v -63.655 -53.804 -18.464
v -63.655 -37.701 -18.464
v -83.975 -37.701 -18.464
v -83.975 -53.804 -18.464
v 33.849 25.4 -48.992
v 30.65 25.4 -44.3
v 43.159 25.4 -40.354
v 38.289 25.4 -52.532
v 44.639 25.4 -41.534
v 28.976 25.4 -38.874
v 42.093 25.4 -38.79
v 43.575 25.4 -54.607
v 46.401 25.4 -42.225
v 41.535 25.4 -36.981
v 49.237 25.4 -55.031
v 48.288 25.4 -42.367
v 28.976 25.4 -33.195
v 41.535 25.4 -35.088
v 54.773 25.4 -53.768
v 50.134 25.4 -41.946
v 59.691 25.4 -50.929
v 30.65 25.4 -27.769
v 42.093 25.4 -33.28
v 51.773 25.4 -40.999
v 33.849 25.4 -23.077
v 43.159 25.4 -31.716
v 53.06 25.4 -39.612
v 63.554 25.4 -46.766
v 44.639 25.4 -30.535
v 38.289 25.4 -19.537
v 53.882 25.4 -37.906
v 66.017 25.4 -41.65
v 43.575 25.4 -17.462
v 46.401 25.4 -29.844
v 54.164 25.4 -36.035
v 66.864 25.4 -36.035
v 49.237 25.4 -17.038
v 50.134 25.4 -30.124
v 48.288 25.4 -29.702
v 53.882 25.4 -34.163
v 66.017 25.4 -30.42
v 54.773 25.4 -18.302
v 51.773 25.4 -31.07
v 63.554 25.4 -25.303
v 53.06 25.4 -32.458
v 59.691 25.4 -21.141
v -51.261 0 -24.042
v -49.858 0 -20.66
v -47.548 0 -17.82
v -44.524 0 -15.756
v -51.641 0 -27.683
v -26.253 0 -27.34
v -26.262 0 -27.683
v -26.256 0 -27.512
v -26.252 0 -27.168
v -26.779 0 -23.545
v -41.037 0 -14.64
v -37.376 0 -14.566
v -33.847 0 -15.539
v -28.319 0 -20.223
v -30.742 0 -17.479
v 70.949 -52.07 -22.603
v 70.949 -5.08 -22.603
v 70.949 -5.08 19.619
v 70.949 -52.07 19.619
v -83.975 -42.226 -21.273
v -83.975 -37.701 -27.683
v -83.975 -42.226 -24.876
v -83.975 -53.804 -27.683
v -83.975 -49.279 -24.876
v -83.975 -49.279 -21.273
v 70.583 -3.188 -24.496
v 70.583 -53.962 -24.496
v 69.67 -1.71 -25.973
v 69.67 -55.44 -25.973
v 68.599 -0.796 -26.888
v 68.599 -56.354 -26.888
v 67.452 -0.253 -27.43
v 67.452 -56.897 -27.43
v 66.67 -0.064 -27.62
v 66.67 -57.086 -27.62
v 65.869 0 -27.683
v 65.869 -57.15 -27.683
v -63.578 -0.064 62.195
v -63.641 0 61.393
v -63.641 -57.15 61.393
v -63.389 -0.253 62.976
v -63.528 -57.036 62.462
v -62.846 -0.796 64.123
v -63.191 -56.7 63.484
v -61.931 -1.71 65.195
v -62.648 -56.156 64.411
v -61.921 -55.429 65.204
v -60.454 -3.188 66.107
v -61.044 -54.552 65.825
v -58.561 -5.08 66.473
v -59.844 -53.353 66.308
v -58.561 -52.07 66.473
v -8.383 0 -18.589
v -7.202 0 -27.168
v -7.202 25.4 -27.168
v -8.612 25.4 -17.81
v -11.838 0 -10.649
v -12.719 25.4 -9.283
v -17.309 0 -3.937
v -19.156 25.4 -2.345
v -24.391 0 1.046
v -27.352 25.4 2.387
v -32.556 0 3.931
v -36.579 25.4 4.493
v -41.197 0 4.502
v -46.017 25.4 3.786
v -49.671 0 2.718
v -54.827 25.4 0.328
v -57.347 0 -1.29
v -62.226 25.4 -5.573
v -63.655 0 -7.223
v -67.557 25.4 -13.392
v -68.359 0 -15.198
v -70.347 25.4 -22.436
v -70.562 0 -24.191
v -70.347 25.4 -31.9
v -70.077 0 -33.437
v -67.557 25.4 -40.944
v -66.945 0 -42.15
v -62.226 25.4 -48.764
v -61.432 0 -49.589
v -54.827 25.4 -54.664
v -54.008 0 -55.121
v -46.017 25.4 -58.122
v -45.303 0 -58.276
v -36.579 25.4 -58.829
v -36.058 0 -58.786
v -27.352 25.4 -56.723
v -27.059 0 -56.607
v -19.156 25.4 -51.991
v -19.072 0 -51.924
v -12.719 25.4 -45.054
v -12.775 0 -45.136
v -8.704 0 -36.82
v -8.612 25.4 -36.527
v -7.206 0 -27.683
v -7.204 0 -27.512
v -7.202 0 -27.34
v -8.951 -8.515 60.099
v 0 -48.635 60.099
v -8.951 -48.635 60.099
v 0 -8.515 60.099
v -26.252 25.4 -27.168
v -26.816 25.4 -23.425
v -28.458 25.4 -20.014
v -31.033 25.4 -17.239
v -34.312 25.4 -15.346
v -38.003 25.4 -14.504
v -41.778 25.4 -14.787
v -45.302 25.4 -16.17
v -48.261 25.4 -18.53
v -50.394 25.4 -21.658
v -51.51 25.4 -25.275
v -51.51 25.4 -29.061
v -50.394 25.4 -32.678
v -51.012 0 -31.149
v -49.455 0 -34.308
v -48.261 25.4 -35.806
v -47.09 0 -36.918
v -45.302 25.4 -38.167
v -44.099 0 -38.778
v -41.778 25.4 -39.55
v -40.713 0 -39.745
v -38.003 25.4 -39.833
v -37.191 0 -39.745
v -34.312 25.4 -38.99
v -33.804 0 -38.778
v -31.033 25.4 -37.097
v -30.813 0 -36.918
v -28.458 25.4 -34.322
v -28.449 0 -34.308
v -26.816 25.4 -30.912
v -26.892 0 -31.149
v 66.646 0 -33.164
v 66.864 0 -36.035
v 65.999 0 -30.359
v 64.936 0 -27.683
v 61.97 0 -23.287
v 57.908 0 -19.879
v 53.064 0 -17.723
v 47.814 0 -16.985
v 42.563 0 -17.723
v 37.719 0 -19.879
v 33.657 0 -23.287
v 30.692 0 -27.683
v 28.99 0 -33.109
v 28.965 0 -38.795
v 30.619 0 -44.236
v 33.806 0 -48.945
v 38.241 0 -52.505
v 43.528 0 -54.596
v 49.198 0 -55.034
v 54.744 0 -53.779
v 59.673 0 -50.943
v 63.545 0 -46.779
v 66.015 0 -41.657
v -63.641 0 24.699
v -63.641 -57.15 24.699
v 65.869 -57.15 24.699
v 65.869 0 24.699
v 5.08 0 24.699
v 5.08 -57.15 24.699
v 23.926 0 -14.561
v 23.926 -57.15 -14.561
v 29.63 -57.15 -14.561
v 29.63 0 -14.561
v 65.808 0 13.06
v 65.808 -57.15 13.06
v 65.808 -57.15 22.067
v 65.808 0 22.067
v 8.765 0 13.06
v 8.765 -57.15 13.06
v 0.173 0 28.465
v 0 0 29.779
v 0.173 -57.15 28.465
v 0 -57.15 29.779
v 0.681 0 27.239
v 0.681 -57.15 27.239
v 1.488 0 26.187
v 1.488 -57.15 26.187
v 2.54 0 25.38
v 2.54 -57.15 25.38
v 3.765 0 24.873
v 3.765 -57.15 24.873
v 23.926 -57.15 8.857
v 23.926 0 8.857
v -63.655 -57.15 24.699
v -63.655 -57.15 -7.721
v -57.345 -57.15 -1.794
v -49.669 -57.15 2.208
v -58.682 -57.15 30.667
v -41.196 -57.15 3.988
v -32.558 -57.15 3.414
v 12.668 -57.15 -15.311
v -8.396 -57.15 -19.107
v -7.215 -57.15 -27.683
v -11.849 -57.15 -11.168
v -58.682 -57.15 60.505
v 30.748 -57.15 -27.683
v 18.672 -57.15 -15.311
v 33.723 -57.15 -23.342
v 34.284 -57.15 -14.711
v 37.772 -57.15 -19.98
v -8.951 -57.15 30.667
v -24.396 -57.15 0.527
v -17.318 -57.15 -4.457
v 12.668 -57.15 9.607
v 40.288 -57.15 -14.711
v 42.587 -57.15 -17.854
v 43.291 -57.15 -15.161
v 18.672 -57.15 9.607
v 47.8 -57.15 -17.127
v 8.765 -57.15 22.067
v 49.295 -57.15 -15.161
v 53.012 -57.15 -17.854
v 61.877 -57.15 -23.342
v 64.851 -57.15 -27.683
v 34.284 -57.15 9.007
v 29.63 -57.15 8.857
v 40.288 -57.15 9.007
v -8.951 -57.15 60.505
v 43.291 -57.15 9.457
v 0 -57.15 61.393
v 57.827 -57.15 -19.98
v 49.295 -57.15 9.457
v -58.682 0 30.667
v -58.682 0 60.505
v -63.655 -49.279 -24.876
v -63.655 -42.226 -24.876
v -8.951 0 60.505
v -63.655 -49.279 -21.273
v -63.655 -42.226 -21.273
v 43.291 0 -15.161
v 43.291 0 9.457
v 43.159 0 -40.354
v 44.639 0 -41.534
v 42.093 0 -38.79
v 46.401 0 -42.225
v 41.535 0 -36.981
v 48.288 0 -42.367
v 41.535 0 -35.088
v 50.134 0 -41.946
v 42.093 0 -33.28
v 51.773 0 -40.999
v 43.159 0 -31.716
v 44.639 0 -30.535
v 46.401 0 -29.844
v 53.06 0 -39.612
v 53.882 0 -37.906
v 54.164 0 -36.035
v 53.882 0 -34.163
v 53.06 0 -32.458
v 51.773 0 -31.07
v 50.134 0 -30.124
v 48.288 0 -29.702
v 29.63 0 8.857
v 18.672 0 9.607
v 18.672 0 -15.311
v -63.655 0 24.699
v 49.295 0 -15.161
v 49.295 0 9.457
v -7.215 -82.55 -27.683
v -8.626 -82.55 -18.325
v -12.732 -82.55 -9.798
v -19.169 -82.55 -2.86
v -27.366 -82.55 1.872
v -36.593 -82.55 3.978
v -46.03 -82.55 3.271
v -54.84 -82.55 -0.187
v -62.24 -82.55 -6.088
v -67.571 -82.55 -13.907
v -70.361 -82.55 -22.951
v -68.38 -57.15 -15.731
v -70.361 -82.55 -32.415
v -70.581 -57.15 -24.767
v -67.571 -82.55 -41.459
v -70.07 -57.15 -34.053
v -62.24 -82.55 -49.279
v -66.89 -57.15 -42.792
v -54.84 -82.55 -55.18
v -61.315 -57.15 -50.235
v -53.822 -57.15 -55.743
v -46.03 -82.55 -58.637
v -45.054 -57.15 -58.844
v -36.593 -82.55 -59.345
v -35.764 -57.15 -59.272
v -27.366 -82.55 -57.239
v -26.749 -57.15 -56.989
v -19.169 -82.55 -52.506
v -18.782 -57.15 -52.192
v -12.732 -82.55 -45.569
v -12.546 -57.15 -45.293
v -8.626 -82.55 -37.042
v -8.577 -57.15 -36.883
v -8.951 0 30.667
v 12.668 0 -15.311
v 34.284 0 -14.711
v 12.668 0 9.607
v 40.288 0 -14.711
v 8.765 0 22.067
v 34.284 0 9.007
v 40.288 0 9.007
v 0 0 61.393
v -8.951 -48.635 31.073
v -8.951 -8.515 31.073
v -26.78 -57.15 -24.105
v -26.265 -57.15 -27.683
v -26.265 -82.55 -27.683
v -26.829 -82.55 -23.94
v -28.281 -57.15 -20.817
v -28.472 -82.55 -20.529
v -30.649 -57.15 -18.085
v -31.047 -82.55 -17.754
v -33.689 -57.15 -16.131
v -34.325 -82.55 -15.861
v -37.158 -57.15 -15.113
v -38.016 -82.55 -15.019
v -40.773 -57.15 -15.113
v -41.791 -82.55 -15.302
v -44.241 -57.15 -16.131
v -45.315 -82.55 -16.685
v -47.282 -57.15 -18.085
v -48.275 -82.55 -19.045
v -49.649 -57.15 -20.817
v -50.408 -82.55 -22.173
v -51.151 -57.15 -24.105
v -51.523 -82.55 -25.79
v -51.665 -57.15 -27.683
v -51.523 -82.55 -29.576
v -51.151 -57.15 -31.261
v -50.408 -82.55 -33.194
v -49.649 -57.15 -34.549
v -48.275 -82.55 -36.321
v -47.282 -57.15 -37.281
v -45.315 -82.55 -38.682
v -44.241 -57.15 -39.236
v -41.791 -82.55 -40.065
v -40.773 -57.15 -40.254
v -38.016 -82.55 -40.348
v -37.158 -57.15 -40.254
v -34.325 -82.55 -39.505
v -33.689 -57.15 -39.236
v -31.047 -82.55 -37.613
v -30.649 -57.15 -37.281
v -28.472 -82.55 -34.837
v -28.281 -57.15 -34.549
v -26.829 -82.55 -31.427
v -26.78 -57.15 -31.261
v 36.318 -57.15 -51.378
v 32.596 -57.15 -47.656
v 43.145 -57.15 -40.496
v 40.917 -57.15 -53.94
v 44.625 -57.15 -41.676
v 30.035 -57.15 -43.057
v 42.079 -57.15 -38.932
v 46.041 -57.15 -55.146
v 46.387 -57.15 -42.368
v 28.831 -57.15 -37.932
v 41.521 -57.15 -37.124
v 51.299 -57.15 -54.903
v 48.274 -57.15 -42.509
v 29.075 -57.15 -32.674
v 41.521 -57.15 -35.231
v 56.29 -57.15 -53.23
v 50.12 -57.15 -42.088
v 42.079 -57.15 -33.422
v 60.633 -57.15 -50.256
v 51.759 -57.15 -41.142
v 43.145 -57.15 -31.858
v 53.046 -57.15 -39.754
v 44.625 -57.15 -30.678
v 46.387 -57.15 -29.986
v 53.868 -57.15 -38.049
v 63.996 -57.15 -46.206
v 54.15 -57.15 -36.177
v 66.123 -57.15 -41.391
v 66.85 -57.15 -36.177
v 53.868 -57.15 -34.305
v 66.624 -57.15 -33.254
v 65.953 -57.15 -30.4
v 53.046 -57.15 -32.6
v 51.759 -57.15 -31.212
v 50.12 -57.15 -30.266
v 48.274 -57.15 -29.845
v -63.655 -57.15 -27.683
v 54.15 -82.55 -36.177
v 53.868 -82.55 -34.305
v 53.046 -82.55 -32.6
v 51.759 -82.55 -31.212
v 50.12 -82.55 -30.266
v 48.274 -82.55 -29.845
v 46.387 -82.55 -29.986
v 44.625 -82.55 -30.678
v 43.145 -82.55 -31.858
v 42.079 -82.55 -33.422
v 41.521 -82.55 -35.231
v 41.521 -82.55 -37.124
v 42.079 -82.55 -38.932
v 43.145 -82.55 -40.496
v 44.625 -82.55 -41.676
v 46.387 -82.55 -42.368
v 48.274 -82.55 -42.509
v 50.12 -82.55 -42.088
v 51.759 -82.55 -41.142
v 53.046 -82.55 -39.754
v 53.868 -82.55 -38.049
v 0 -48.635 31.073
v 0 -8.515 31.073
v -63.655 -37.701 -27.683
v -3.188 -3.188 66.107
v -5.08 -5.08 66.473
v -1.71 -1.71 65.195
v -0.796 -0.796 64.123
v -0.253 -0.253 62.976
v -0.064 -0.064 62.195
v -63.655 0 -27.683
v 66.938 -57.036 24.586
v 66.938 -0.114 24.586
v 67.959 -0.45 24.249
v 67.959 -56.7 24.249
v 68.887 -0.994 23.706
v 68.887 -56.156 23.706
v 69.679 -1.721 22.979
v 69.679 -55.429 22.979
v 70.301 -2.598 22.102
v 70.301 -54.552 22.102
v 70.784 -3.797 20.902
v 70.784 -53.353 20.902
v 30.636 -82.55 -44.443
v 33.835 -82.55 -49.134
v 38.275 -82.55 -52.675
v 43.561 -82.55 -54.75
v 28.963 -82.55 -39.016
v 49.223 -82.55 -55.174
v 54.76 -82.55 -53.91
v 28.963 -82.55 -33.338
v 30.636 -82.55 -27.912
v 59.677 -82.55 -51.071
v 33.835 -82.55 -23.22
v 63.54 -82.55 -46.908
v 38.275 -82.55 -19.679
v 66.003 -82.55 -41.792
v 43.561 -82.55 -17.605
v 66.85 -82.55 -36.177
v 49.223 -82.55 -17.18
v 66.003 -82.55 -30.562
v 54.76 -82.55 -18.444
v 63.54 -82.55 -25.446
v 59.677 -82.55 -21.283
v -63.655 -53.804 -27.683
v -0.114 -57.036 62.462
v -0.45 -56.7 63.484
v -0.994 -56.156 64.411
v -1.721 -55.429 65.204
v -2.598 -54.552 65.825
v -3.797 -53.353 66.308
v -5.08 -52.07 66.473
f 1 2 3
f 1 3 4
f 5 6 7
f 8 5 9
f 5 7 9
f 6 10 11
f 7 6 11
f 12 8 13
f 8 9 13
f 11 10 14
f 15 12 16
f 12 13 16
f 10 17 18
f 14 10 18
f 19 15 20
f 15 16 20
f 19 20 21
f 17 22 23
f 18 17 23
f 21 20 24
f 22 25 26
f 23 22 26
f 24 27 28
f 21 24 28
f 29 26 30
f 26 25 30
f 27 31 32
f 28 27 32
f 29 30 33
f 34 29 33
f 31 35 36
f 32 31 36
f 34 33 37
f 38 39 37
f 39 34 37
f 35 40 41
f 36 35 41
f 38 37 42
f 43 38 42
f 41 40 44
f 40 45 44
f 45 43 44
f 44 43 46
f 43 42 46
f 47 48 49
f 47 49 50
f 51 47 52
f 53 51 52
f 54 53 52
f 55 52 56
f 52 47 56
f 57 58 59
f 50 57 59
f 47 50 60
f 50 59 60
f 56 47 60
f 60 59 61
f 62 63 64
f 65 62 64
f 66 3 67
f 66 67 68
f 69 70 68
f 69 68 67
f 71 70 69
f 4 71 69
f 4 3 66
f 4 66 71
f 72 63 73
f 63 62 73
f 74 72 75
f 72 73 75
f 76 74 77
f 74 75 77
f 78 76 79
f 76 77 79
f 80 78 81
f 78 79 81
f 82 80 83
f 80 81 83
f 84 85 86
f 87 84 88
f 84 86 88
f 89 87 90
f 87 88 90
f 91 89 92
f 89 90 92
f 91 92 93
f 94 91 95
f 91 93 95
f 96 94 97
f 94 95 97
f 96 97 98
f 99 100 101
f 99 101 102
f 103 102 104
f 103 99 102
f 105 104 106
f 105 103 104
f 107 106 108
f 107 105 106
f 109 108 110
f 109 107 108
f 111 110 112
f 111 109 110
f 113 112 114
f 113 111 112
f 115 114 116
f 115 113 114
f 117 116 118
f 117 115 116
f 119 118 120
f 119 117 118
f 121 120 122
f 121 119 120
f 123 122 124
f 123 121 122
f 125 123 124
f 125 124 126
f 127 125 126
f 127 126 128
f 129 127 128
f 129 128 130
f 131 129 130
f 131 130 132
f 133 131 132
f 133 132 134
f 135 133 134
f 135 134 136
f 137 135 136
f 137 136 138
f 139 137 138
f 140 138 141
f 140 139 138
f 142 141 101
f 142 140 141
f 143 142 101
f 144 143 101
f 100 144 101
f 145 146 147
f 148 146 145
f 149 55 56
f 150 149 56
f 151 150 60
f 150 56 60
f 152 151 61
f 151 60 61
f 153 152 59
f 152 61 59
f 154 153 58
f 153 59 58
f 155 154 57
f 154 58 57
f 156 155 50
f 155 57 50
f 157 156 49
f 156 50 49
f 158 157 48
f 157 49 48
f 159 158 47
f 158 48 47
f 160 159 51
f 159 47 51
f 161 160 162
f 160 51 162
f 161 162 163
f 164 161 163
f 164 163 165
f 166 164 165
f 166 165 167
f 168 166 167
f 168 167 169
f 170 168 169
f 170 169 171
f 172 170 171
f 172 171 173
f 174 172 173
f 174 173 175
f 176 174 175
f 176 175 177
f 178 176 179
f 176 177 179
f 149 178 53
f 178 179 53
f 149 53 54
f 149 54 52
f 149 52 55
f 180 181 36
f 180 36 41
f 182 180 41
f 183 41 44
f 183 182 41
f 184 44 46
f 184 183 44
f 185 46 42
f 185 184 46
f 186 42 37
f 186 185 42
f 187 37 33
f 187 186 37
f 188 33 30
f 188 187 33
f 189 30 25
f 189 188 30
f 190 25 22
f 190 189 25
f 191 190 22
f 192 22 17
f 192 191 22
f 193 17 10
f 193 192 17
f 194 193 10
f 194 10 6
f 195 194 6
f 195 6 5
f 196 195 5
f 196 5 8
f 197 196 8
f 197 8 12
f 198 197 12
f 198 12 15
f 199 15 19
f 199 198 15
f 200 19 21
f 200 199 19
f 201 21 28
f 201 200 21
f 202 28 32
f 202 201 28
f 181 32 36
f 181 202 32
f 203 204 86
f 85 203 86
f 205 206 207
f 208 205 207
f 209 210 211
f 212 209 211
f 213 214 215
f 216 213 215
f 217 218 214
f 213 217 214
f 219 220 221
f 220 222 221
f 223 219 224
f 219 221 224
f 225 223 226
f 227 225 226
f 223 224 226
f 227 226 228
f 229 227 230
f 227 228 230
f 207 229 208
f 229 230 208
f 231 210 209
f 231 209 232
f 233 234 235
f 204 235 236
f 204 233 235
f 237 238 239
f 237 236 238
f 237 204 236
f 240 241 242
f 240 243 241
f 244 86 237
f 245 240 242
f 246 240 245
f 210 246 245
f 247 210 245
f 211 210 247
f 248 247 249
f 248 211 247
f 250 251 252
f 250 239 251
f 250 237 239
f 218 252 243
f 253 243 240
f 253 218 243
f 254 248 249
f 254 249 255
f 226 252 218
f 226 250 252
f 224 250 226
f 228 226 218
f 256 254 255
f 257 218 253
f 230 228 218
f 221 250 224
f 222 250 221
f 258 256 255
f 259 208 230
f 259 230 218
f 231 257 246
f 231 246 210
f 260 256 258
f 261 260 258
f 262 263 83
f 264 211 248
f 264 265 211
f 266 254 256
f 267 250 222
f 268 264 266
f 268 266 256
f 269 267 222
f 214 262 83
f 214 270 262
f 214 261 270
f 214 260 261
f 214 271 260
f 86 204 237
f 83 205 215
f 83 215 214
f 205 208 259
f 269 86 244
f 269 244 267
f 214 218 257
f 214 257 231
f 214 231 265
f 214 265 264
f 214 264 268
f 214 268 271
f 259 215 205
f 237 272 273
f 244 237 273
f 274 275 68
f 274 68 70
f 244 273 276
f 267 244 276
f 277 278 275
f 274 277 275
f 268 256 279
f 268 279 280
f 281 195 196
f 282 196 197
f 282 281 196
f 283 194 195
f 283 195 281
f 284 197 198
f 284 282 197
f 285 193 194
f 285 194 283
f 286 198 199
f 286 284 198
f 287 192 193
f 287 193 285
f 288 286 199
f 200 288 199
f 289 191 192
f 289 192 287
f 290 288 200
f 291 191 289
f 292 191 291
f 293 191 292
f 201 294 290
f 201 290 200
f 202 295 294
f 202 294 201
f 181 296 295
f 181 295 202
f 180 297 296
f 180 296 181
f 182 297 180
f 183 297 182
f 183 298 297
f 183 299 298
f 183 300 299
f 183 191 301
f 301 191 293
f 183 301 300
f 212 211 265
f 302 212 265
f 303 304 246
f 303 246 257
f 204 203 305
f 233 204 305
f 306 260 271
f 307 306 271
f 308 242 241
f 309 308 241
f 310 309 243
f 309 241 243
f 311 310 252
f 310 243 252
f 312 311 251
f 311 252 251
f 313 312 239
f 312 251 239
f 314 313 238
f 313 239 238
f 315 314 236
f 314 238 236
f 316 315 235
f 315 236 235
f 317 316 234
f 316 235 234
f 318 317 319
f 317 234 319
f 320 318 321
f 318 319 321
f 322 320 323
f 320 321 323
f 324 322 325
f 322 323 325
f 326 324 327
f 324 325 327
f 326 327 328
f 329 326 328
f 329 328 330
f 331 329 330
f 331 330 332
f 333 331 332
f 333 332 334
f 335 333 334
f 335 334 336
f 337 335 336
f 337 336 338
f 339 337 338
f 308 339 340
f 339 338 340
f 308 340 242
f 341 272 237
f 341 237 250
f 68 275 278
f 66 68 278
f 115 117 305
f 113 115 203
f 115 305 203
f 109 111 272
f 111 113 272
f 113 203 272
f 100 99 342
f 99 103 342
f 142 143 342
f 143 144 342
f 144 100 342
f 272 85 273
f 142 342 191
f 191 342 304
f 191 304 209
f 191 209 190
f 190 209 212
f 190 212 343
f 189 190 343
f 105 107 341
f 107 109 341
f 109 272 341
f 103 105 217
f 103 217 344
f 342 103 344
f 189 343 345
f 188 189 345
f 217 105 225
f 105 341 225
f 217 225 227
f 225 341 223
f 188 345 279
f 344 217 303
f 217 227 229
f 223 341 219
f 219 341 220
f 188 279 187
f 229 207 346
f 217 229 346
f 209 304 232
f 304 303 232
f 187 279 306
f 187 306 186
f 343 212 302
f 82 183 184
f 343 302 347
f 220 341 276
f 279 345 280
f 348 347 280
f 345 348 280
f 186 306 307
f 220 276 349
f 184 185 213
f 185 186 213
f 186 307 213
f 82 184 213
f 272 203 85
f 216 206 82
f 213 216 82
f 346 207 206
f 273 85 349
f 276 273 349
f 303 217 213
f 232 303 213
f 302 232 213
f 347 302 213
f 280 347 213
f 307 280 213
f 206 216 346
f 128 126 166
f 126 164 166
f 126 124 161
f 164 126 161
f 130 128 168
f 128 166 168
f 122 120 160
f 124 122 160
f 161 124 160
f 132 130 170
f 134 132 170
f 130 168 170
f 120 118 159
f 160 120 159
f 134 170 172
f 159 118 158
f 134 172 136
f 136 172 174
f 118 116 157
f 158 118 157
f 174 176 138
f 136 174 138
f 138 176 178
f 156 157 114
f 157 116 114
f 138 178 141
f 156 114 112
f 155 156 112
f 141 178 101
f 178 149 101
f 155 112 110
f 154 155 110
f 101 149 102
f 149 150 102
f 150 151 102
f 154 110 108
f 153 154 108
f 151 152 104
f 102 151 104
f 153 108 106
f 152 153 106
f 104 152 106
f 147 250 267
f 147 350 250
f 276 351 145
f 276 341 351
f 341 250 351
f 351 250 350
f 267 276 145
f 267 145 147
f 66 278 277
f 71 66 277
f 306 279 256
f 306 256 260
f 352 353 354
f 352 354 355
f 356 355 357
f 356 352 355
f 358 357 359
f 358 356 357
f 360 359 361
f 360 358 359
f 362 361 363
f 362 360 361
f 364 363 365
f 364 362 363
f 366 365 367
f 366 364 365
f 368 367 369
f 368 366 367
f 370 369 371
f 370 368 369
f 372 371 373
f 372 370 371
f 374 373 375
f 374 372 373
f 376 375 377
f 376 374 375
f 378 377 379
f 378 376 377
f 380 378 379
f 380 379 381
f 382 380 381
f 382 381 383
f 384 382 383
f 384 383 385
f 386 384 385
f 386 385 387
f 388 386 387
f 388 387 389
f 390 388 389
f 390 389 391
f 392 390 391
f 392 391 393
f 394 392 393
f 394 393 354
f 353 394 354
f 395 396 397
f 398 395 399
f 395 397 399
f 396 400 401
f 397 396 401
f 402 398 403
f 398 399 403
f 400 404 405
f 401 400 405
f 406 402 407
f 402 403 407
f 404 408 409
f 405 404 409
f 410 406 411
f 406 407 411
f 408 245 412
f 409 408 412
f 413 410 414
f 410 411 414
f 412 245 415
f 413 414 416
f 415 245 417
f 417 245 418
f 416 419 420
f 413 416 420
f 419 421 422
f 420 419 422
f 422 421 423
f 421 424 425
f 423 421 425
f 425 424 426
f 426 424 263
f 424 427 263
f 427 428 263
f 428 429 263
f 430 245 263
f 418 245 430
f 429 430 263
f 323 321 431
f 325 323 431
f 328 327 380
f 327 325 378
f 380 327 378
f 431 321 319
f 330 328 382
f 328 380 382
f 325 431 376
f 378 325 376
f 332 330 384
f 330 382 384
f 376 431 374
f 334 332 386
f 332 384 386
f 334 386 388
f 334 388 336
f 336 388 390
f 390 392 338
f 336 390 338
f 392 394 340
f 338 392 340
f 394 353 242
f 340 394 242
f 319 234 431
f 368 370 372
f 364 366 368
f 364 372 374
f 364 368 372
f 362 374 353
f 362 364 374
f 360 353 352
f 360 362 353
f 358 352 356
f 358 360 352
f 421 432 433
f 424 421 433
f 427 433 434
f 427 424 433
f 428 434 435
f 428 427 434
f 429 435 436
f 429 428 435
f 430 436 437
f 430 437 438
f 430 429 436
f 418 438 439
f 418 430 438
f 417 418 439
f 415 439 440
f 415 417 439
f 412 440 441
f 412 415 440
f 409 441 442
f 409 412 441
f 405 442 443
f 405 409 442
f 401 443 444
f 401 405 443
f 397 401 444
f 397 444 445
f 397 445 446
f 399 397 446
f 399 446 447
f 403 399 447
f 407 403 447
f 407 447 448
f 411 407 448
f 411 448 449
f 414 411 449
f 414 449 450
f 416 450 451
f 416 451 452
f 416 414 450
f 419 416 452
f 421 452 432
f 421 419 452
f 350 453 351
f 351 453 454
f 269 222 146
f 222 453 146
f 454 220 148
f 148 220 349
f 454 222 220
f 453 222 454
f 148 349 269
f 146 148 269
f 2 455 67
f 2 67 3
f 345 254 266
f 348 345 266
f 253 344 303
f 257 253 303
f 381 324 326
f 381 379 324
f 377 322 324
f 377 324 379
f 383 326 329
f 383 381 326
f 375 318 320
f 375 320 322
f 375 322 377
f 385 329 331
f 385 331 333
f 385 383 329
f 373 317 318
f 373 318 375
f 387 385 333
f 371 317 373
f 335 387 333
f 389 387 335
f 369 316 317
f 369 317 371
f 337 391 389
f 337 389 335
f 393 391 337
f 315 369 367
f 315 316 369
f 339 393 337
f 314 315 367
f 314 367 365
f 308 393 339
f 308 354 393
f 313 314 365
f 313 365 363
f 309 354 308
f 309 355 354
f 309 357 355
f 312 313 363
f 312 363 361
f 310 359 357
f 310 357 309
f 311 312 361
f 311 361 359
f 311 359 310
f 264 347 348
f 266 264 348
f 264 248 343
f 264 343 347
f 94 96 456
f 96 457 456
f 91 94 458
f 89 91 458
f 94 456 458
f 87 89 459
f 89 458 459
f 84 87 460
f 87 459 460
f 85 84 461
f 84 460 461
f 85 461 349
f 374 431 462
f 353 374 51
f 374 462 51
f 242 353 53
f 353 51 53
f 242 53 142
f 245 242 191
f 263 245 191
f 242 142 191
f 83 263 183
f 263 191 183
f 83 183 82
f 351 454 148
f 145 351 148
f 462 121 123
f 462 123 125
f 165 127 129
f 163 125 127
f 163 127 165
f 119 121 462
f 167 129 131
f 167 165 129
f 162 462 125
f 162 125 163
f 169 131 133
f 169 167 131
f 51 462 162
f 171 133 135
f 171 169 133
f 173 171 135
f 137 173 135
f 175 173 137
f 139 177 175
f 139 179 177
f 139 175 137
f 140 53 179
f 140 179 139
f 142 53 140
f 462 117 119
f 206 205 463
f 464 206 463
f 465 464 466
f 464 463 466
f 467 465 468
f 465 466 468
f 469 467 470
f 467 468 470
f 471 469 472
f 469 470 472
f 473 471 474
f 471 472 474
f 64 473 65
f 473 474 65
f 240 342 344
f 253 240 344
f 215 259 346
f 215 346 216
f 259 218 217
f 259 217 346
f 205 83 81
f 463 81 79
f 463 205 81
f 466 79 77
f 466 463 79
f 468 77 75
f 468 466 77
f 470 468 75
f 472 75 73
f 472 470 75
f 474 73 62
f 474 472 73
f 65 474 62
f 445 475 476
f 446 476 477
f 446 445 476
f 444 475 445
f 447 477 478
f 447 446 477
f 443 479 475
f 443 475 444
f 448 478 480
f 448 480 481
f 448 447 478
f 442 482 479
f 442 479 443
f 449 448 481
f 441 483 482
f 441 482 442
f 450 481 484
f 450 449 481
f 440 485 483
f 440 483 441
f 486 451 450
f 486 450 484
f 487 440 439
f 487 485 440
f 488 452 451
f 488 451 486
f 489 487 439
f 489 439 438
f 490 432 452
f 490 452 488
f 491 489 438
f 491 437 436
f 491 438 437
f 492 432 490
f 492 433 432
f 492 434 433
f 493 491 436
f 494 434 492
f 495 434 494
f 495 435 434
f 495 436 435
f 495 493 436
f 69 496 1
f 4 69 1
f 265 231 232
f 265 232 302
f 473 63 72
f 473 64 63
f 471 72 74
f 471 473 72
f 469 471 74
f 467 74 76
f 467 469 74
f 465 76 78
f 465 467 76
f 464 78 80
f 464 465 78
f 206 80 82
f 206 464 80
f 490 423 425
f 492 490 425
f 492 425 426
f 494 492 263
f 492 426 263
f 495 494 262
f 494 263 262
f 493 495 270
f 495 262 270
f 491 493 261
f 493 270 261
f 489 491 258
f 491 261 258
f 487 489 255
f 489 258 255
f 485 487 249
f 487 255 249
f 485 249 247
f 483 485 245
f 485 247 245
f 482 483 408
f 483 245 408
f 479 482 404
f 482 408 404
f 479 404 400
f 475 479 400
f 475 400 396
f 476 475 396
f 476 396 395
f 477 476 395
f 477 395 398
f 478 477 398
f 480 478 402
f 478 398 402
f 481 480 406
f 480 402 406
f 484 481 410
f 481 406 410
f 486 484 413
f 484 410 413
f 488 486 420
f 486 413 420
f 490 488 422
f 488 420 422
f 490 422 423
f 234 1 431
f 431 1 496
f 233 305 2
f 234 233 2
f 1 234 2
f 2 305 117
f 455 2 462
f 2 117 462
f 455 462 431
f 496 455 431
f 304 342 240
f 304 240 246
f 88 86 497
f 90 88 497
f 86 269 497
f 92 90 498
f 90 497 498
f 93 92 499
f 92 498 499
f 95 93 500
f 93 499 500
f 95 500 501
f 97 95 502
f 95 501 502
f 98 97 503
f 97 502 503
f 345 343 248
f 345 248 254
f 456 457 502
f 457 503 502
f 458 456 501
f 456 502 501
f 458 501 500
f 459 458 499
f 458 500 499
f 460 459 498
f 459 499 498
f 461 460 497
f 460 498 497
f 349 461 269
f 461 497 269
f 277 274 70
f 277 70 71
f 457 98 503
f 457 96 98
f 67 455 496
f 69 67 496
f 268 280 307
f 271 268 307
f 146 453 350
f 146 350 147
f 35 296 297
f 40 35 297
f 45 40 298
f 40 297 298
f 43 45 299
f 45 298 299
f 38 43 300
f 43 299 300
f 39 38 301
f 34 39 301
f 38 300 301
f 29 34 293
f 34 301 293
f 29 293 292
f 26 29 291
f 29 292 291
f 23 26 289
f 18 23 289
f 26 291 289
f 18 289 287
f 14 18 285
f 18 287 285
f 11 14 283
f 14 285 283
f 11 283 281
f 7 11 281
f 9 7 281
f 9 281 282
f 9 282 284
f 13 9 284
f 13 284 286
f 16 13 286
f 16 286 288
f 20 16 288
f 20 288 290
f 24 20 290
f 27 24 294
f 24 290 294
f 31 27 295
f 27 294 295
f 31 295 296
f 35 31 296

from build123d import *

# Parameters (mm, degrees)
F0_W      = 63.641474
F0_H      = 41.773599
F0_W_2    = 49.73047
F0_H_2    = 29.838283
F1_DEPTH  = 57.15
F2_R      = 19.05
F2_R_2    = 6.35
F2_R_3    = 31.75
F2_R_4    = 12.7
F3_DEPTH  = 25.4
F4_R      = 31.75
F4_R_2    = 12.7
F4_R_3    = 19.05
F4_R_4    = 6.35
F5_DEPTH  = 25.4
F6_W      = 40.11992
F6_H      = 29.025927
F7_DEPTH  = 25.4
F8_R      = 5.08
F9_W      = 16.103194
F9_H      = 9.219451
F9_W_2    = 7.053554
F9_H_2    = 3.602702
F10_DEPTH = 20.32
F11_W     = 57.042776
F11_H     = 9.006755
F11_W_2   = 6.004483
F11_H_2   = 24.91869
F11_W_3   = 5.704254
F11_H_3   = 23.417564
F11_H_4   = 24.618464
F11_W_4   = 6.004482
F11_H_5   = 23.717788
F12_DEPTH = 63.246


with BuildPart() as f1:
    # F0 (on Front) → F1 (new body)
    with BuildSketch(Plane.XZ):
        Polygon((-63.641474, 24.699468), (-63.655011, 24.699468), (-63.655011, -27.683297), (70.948809, -27.683297), (70.948809, 24.699468), (0, 24.699468), align=None)
        with Locations((-31.820737, 45.586267)):
            Rectangle(F0_W, F0_H)
        with Locations((-33.816721, 45.586267)):
            Rectangle(F0_W_2, F0_H_2, mode=Mode.SUBTRACT)
    extrude(amount=F1_DEPTH)

    # F2 (on Front) → F3 (join)
    with BuildSketch(Plane.XZ):
        with Locations((47.813714, -36.03467)):
            Circle(F2_R)
        with Locations((47.813714, -36.03467)):
            Circle(F2_R_2, mode=Mode.SUBTRACT)
        with Locations((-38.951659, -27.168135)):
            Circle(F2_R_3)
        with Locations((-38.951659, -27.168135)):
            Circle(F2_R_4, mode=Mode.SUBTRACT)
    extrude(amount=-F3_DEPTH)

    # F4 (on face) → F5 (join)
    with BuildSketch(Plane.XZ.offset(57.15)):
        with Locations((-38.965259, -27.683297)):
            Circle(F4_R)
        with Locations((-38.965259, -27.683297)):
            Circle(F4_R_2, mode=Mode.SUBTRACT)
        with Locations((47.799807, -36.177129)):
            Circle(F4_R_3)
        with Locations((47.799807, -36.177129)):
            Circle(F4_R_4, mode=Mode.SUBTRACT)
    extrude(amount=F5_DEPTH)

    # F6 (on face) → F7 (cut)
    with BuildSketch(Plane.YZ):
        with Locations((-28.575, 45.586267)):
            Rectangle(F6_W, F6_H)
    extrude(amount=-F7_DEPTH, mode=Mode.SUBTRACT)

    # F8
    f8_edges = [f1.edges().sort_by_distance(p)[0] for p in [
        (0, -28.575, 24.699468),
        (70.948809, -28.575, 24.699468),
        (70.948809, -28.575, -27.683297),
        (70.948809, 0, -1.491915),
        (70.948809, -57.15, -1.491915),
        (-31.820737, -57.15, 66.473067),
        (0, -28.575, 66.473067),
        (-31.820737, 0, 66.473067),
        (-63.641474, -28.575, 66.473067),
    ]]
    fillet(f8_edges, radius=F8_R)

    # F9 (on face) → F10 (join)
    with BuildSketch(Plane(origin=(-63.655011, 0, 0), x_dir=(0, -1, 0), z_dir=(-1, 0, 0))):
        with Locations((45.752488, -23.073571)):
            Rectangle(F9_W, F9_H)
        with Locations((45.752488, -23.074446)):
            Rectangle(F9_W_2, F9_H_2, mode=Mode.SUBTRACT)
    extrude(amount=F10_DEPTH)

    # F11 (on face) → F12 (cut)
    with BuildSketch(Plane.XZ.offset(57.15)):
        with Locations((37.286255, 17.56317)):
            Rectangle(F11_W, F11_H)
        with Locations((15.67004, -2.852139)):
            Rectangle(F11_W_2, F11_H_2)
        with Locations((26.778372, -2.852139)):
            Rectangle(F11_W_3, F11_H_3)
        with Locations((46.293005, -2.852139)):
            Rectangle(F11_W_2, F11_H_4)
        with Locations((37.286252, -2.852139)):
            Rectangle(F11_W_4, F11_H_5)
    extrude(amount=-F12_DEPTH, mode=Mode.SUBTRACT)


solid = f1.part
